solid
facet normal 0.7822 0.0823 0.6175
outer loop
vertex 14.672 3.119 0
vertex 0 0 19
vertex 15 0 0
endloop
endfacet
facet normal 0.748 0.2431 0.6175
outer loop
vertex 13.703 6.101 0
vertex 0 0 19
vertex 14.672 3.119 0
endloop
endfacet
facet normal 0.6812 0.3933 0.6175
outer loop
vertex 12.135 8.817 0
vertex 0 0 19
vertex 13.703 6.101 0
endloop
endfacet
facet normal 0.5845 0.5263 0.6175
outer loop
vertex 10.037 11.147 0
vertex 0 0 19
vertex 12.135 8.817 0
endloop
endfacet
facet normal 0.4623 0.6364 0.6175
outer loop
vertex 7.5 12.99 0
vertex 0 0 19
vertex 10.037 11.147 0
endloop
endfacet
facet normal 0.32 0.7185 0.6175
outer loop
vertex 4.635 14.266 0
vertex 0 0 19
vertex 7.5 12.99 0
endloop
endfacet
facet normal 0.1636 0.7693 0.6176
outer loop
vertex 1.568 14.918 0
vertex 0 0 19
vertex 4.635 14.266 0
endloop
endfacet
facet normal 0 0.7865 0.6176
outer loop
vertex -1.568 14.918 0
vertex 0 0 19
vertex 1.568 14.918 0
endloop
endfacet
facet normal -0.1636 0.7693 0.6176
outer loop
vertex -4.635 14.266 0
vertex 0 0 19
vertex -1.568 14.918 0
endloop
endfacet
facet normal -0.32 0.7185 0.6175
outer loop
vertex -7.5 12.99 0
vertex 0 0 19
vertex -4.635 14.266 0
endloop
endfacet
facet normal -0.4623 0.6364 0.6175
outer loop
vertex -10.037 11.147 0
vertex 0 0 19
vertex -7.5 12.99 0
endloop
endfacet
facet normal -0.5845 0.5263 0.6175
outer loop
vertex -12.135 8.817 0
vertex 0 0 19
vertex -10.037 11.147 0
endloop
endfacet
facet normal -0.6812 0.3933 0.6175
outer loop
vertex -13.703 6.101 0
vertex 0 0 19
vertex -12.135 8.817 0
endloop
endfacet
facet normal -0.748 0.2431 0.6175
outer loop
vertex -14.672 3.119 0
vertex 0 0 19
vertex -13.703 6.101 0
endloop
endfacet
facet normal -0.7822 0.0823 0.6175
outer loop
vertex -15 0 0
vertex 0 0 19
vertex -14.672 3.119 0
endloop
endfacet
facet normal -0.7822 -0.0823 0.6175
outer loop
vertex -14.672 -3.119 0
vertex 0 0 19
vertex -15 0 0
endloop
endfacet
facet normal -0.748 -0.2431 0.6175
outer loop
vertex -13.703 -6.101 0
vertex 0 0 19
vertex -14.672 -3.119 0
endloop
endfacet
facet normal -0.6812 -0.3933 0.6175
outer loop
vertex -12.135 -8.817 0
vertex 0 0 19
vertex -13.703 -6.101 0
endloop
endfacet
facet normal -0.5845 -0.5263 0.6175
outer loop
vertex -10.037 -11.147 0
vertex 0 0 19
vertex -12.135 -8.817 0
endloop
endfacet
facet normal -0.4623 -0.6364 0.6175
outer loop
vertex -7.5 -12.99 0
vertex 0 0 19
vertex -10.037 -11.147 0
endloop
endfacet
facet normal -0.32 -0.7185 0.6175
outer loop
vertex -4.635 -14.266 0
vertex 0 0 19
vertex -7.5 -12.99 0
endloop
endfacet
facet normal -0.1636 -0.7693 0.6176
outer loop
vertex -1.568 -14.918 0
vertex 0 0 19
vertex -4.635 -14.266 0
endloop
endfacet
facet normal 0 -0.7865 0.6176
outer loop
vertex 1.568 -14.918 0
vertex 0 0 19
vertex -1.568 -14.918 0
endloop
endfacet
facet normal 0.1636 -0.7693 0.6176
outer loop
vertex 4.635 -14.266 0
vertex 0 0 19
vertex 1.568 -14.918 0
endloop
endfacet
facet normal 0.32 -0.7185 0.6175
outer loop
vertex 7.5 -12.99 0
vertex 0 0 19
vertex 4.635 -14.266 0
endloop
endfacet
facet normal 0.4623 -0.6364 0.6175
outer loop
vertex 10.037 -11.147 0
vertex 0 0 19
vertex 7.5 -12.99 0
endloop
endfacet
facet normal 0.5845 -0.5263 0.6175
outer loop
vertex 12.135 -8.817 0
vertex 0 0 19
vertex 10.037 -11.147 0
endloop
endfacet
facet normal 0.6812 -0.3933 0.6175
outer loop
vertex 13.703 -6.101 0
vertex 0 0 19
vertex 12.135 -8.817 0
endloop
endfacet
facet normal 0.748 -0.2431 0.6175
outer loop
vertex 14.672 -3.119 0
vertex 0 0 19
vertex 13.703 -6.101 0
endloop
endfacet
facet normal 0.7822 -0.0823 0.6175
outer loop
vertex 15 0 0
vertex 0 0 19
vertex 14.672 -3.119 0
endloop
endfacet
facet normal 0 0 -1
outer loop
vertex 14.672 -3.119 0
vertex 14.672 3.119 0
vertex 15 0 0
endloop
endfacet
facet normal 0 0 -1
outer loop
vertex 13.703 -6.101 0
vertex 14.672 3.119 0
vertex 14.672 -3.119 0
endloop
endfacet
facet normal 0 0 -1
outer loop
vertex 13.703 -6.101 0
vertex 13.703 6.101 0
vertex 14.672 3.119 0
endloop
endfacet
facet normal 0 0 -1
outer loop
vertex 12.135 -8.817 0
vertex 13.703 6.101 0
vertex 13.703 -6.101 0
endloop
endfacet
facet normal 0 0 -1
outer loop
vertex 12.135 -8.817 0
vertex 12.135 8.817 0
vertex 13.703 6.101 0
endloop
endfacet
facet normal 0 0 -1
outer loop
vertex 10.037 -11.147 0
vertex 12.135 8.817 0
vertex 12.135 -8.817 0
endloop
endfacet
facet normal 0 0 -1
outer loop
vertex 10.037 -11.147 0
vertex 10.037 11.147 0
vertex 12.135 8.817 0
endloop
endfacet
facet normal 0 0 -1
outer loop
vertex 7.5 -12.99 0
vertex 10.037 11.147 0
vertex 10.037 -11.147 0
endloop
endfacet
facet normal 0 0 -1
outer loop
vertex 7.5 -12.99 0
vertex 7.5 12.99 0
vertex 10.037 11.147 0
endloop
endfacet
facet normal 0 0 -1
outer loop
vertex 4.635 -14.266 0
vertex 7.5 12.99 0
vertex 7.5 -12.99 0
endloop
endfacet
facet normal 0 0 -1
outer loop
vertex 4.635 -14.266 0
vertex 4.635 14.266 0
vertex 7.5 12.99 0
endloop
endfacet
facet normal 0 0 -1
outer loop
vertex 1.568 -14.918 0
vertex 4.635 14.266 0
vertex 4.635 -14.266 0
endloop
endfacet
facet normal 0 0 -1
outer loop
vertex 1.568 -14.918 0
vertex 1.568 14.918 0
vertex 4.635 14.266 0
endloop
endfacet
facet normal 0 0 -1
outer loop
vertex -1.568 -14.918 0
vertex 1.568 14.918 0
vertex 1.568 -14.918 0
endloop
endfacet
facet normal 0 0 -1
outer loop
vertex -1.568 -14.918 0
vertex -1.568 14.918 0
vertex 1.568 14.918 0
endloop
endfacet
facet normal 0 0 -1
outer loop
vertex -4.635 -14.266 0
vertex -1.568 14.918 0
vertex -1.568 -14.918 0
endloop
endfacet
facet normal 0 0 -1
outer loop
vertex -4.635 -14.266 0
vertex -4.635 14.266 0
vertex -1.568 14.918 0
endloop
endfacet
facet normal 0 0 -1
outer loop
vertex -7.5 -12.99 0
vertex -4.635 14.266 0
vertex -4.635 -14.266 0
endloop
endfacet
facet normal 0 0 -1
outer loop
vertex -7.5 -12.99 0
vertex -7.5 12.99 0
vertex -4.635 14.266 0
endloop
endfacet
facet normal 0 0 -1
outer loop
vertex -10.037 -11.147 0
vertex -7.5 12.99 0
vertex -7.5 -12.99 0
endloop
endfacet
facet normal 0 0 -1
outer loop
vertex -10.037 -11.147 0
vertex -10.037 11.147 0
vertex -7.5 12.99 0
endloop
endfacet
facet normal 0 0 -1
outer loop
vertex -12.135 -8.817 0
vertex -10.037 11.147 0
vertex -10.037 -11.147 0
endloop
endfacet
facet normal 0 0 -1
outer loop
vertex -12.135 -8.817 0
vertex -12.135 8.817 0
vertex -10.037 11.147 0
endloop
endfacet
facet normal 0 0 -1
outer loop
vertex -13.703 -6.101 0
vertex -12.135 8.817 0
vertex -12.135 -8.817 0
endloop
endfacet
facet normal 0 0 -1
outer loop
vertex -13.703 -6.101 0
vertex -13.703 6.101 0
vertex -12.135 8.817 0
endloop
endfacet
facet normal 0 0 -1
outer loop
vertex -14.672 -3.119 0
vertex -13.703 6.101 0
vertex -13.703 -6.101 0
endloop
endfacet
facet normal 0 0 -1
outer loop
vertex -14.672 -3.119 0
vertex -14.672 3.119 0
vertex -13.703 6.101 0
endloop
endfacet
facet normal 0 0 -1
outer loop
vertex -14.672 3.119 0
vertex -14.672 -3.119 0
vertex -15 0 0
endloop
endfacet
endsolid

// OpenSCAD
// Generated by SolidPython 1.0.1 on 2020-07-29 00:46:43


cylinder(h = 19, r1 = 15, r2 = 0);
/***********************************************
*********      SolidPython code:      **********
************************************************
 
# import packages: SolidPython
from solid import *
from solid.utils import *
from itertools import chain, combinations, permutations


class Resize:

    def __init__(self, scad_file):
        self.scad_file = scad_file
        #self.scad_file = import_scad(scad_file)
        # cone/cylinder param:
        self.r1 = 0
        self.r2 = 0
        self.h = 0
        # rectangular prism param:
        self.w = 0
        self.l = 0
        # ellipse param:
        self.r = 0

    # import OpenScad code (file name corresponds to shape)


    # classify shape + parameters
    def assign(self, param1, param2, param3):
        if self.scad_file == 'cone.scad':
            self.r1 = param1
            self.r2 = param2
            self.h = param3
        elif self.scad_file == 'cylinder.scad':
            self.r1 = param1
            self.r2 = param2
            self.h = param3
        elif self.scad_file == 'rectangularPrism.scad':
            self.h = param1
            self.l = param2
            self.w = param3
        else:
            self.r = param1
            self.h = param2

    # resize parameters
    def iterate(self):
        x = range(3, 20, 2)
        i = 1
        if self.scad_file == 'cone.scad':
            tempList = list(permutations(x, 2))
            for temp in tempList:
                param1 = temp[0]
                param2 = temp[1]
                filepath = 'produced_scad_files/' + 'cone' + str(param1) + '_' + str(param2) + '_' + '.scad'
                scad_render_to_file(cylinder(h=param1, r1=param2, r2=0), filepath)

        elif self.scad_file == 'cylinder.scad':
            tempList = list(permutations(x, 3))
            for temp in tempList:
                param1 = temp[0]
                param2 = temp[1]
                filepath = 'produced_scad_files/' + 'cylinder' + str(param1) + '_' + str(param2) + '_' + '.scad'
                scad_render_to_file(cylinder(h=param1, r1=param2, r2=param2), filepath)

        elif self.scad_file == 'rectangularPrism.scad':
            tempList = list(permutations(x, 3))
            for temp in tempList:
                param1 = temp[0]
                param2 = temp[1]
                param3 = temp[2]
                filepath = 'produced_scad_files/' + 'rectangularPrism' + str(param1) + '_' + str(param2) + '_' + str(
                    param3) + '.scad'
                scad_render_to_file(cube(size=(param1, param2, param3)), filepath)

        elif self.scad_file == 'ellipse.scad':
            tempList = list(permutations(x, 4))
            for temp in tempList:
                param1 = temp[0]
                param2 = temp[1]
                param3 = temp[2]
                param4 = temp[3]
                filepath = 'produced_scad_files/' + 'ellipse' + str(param1) + '_' + str(param2) + '_' + str(param3) + '_' + str(param4) + '.scad'
                scad_render_to_file(scale([param1, param2, param3])(sphere(r=param4)), filepath)

    def render_to_scadfile(self):
        scad_render_to_file(scad, 'example.scad') 
 
************************************************/
